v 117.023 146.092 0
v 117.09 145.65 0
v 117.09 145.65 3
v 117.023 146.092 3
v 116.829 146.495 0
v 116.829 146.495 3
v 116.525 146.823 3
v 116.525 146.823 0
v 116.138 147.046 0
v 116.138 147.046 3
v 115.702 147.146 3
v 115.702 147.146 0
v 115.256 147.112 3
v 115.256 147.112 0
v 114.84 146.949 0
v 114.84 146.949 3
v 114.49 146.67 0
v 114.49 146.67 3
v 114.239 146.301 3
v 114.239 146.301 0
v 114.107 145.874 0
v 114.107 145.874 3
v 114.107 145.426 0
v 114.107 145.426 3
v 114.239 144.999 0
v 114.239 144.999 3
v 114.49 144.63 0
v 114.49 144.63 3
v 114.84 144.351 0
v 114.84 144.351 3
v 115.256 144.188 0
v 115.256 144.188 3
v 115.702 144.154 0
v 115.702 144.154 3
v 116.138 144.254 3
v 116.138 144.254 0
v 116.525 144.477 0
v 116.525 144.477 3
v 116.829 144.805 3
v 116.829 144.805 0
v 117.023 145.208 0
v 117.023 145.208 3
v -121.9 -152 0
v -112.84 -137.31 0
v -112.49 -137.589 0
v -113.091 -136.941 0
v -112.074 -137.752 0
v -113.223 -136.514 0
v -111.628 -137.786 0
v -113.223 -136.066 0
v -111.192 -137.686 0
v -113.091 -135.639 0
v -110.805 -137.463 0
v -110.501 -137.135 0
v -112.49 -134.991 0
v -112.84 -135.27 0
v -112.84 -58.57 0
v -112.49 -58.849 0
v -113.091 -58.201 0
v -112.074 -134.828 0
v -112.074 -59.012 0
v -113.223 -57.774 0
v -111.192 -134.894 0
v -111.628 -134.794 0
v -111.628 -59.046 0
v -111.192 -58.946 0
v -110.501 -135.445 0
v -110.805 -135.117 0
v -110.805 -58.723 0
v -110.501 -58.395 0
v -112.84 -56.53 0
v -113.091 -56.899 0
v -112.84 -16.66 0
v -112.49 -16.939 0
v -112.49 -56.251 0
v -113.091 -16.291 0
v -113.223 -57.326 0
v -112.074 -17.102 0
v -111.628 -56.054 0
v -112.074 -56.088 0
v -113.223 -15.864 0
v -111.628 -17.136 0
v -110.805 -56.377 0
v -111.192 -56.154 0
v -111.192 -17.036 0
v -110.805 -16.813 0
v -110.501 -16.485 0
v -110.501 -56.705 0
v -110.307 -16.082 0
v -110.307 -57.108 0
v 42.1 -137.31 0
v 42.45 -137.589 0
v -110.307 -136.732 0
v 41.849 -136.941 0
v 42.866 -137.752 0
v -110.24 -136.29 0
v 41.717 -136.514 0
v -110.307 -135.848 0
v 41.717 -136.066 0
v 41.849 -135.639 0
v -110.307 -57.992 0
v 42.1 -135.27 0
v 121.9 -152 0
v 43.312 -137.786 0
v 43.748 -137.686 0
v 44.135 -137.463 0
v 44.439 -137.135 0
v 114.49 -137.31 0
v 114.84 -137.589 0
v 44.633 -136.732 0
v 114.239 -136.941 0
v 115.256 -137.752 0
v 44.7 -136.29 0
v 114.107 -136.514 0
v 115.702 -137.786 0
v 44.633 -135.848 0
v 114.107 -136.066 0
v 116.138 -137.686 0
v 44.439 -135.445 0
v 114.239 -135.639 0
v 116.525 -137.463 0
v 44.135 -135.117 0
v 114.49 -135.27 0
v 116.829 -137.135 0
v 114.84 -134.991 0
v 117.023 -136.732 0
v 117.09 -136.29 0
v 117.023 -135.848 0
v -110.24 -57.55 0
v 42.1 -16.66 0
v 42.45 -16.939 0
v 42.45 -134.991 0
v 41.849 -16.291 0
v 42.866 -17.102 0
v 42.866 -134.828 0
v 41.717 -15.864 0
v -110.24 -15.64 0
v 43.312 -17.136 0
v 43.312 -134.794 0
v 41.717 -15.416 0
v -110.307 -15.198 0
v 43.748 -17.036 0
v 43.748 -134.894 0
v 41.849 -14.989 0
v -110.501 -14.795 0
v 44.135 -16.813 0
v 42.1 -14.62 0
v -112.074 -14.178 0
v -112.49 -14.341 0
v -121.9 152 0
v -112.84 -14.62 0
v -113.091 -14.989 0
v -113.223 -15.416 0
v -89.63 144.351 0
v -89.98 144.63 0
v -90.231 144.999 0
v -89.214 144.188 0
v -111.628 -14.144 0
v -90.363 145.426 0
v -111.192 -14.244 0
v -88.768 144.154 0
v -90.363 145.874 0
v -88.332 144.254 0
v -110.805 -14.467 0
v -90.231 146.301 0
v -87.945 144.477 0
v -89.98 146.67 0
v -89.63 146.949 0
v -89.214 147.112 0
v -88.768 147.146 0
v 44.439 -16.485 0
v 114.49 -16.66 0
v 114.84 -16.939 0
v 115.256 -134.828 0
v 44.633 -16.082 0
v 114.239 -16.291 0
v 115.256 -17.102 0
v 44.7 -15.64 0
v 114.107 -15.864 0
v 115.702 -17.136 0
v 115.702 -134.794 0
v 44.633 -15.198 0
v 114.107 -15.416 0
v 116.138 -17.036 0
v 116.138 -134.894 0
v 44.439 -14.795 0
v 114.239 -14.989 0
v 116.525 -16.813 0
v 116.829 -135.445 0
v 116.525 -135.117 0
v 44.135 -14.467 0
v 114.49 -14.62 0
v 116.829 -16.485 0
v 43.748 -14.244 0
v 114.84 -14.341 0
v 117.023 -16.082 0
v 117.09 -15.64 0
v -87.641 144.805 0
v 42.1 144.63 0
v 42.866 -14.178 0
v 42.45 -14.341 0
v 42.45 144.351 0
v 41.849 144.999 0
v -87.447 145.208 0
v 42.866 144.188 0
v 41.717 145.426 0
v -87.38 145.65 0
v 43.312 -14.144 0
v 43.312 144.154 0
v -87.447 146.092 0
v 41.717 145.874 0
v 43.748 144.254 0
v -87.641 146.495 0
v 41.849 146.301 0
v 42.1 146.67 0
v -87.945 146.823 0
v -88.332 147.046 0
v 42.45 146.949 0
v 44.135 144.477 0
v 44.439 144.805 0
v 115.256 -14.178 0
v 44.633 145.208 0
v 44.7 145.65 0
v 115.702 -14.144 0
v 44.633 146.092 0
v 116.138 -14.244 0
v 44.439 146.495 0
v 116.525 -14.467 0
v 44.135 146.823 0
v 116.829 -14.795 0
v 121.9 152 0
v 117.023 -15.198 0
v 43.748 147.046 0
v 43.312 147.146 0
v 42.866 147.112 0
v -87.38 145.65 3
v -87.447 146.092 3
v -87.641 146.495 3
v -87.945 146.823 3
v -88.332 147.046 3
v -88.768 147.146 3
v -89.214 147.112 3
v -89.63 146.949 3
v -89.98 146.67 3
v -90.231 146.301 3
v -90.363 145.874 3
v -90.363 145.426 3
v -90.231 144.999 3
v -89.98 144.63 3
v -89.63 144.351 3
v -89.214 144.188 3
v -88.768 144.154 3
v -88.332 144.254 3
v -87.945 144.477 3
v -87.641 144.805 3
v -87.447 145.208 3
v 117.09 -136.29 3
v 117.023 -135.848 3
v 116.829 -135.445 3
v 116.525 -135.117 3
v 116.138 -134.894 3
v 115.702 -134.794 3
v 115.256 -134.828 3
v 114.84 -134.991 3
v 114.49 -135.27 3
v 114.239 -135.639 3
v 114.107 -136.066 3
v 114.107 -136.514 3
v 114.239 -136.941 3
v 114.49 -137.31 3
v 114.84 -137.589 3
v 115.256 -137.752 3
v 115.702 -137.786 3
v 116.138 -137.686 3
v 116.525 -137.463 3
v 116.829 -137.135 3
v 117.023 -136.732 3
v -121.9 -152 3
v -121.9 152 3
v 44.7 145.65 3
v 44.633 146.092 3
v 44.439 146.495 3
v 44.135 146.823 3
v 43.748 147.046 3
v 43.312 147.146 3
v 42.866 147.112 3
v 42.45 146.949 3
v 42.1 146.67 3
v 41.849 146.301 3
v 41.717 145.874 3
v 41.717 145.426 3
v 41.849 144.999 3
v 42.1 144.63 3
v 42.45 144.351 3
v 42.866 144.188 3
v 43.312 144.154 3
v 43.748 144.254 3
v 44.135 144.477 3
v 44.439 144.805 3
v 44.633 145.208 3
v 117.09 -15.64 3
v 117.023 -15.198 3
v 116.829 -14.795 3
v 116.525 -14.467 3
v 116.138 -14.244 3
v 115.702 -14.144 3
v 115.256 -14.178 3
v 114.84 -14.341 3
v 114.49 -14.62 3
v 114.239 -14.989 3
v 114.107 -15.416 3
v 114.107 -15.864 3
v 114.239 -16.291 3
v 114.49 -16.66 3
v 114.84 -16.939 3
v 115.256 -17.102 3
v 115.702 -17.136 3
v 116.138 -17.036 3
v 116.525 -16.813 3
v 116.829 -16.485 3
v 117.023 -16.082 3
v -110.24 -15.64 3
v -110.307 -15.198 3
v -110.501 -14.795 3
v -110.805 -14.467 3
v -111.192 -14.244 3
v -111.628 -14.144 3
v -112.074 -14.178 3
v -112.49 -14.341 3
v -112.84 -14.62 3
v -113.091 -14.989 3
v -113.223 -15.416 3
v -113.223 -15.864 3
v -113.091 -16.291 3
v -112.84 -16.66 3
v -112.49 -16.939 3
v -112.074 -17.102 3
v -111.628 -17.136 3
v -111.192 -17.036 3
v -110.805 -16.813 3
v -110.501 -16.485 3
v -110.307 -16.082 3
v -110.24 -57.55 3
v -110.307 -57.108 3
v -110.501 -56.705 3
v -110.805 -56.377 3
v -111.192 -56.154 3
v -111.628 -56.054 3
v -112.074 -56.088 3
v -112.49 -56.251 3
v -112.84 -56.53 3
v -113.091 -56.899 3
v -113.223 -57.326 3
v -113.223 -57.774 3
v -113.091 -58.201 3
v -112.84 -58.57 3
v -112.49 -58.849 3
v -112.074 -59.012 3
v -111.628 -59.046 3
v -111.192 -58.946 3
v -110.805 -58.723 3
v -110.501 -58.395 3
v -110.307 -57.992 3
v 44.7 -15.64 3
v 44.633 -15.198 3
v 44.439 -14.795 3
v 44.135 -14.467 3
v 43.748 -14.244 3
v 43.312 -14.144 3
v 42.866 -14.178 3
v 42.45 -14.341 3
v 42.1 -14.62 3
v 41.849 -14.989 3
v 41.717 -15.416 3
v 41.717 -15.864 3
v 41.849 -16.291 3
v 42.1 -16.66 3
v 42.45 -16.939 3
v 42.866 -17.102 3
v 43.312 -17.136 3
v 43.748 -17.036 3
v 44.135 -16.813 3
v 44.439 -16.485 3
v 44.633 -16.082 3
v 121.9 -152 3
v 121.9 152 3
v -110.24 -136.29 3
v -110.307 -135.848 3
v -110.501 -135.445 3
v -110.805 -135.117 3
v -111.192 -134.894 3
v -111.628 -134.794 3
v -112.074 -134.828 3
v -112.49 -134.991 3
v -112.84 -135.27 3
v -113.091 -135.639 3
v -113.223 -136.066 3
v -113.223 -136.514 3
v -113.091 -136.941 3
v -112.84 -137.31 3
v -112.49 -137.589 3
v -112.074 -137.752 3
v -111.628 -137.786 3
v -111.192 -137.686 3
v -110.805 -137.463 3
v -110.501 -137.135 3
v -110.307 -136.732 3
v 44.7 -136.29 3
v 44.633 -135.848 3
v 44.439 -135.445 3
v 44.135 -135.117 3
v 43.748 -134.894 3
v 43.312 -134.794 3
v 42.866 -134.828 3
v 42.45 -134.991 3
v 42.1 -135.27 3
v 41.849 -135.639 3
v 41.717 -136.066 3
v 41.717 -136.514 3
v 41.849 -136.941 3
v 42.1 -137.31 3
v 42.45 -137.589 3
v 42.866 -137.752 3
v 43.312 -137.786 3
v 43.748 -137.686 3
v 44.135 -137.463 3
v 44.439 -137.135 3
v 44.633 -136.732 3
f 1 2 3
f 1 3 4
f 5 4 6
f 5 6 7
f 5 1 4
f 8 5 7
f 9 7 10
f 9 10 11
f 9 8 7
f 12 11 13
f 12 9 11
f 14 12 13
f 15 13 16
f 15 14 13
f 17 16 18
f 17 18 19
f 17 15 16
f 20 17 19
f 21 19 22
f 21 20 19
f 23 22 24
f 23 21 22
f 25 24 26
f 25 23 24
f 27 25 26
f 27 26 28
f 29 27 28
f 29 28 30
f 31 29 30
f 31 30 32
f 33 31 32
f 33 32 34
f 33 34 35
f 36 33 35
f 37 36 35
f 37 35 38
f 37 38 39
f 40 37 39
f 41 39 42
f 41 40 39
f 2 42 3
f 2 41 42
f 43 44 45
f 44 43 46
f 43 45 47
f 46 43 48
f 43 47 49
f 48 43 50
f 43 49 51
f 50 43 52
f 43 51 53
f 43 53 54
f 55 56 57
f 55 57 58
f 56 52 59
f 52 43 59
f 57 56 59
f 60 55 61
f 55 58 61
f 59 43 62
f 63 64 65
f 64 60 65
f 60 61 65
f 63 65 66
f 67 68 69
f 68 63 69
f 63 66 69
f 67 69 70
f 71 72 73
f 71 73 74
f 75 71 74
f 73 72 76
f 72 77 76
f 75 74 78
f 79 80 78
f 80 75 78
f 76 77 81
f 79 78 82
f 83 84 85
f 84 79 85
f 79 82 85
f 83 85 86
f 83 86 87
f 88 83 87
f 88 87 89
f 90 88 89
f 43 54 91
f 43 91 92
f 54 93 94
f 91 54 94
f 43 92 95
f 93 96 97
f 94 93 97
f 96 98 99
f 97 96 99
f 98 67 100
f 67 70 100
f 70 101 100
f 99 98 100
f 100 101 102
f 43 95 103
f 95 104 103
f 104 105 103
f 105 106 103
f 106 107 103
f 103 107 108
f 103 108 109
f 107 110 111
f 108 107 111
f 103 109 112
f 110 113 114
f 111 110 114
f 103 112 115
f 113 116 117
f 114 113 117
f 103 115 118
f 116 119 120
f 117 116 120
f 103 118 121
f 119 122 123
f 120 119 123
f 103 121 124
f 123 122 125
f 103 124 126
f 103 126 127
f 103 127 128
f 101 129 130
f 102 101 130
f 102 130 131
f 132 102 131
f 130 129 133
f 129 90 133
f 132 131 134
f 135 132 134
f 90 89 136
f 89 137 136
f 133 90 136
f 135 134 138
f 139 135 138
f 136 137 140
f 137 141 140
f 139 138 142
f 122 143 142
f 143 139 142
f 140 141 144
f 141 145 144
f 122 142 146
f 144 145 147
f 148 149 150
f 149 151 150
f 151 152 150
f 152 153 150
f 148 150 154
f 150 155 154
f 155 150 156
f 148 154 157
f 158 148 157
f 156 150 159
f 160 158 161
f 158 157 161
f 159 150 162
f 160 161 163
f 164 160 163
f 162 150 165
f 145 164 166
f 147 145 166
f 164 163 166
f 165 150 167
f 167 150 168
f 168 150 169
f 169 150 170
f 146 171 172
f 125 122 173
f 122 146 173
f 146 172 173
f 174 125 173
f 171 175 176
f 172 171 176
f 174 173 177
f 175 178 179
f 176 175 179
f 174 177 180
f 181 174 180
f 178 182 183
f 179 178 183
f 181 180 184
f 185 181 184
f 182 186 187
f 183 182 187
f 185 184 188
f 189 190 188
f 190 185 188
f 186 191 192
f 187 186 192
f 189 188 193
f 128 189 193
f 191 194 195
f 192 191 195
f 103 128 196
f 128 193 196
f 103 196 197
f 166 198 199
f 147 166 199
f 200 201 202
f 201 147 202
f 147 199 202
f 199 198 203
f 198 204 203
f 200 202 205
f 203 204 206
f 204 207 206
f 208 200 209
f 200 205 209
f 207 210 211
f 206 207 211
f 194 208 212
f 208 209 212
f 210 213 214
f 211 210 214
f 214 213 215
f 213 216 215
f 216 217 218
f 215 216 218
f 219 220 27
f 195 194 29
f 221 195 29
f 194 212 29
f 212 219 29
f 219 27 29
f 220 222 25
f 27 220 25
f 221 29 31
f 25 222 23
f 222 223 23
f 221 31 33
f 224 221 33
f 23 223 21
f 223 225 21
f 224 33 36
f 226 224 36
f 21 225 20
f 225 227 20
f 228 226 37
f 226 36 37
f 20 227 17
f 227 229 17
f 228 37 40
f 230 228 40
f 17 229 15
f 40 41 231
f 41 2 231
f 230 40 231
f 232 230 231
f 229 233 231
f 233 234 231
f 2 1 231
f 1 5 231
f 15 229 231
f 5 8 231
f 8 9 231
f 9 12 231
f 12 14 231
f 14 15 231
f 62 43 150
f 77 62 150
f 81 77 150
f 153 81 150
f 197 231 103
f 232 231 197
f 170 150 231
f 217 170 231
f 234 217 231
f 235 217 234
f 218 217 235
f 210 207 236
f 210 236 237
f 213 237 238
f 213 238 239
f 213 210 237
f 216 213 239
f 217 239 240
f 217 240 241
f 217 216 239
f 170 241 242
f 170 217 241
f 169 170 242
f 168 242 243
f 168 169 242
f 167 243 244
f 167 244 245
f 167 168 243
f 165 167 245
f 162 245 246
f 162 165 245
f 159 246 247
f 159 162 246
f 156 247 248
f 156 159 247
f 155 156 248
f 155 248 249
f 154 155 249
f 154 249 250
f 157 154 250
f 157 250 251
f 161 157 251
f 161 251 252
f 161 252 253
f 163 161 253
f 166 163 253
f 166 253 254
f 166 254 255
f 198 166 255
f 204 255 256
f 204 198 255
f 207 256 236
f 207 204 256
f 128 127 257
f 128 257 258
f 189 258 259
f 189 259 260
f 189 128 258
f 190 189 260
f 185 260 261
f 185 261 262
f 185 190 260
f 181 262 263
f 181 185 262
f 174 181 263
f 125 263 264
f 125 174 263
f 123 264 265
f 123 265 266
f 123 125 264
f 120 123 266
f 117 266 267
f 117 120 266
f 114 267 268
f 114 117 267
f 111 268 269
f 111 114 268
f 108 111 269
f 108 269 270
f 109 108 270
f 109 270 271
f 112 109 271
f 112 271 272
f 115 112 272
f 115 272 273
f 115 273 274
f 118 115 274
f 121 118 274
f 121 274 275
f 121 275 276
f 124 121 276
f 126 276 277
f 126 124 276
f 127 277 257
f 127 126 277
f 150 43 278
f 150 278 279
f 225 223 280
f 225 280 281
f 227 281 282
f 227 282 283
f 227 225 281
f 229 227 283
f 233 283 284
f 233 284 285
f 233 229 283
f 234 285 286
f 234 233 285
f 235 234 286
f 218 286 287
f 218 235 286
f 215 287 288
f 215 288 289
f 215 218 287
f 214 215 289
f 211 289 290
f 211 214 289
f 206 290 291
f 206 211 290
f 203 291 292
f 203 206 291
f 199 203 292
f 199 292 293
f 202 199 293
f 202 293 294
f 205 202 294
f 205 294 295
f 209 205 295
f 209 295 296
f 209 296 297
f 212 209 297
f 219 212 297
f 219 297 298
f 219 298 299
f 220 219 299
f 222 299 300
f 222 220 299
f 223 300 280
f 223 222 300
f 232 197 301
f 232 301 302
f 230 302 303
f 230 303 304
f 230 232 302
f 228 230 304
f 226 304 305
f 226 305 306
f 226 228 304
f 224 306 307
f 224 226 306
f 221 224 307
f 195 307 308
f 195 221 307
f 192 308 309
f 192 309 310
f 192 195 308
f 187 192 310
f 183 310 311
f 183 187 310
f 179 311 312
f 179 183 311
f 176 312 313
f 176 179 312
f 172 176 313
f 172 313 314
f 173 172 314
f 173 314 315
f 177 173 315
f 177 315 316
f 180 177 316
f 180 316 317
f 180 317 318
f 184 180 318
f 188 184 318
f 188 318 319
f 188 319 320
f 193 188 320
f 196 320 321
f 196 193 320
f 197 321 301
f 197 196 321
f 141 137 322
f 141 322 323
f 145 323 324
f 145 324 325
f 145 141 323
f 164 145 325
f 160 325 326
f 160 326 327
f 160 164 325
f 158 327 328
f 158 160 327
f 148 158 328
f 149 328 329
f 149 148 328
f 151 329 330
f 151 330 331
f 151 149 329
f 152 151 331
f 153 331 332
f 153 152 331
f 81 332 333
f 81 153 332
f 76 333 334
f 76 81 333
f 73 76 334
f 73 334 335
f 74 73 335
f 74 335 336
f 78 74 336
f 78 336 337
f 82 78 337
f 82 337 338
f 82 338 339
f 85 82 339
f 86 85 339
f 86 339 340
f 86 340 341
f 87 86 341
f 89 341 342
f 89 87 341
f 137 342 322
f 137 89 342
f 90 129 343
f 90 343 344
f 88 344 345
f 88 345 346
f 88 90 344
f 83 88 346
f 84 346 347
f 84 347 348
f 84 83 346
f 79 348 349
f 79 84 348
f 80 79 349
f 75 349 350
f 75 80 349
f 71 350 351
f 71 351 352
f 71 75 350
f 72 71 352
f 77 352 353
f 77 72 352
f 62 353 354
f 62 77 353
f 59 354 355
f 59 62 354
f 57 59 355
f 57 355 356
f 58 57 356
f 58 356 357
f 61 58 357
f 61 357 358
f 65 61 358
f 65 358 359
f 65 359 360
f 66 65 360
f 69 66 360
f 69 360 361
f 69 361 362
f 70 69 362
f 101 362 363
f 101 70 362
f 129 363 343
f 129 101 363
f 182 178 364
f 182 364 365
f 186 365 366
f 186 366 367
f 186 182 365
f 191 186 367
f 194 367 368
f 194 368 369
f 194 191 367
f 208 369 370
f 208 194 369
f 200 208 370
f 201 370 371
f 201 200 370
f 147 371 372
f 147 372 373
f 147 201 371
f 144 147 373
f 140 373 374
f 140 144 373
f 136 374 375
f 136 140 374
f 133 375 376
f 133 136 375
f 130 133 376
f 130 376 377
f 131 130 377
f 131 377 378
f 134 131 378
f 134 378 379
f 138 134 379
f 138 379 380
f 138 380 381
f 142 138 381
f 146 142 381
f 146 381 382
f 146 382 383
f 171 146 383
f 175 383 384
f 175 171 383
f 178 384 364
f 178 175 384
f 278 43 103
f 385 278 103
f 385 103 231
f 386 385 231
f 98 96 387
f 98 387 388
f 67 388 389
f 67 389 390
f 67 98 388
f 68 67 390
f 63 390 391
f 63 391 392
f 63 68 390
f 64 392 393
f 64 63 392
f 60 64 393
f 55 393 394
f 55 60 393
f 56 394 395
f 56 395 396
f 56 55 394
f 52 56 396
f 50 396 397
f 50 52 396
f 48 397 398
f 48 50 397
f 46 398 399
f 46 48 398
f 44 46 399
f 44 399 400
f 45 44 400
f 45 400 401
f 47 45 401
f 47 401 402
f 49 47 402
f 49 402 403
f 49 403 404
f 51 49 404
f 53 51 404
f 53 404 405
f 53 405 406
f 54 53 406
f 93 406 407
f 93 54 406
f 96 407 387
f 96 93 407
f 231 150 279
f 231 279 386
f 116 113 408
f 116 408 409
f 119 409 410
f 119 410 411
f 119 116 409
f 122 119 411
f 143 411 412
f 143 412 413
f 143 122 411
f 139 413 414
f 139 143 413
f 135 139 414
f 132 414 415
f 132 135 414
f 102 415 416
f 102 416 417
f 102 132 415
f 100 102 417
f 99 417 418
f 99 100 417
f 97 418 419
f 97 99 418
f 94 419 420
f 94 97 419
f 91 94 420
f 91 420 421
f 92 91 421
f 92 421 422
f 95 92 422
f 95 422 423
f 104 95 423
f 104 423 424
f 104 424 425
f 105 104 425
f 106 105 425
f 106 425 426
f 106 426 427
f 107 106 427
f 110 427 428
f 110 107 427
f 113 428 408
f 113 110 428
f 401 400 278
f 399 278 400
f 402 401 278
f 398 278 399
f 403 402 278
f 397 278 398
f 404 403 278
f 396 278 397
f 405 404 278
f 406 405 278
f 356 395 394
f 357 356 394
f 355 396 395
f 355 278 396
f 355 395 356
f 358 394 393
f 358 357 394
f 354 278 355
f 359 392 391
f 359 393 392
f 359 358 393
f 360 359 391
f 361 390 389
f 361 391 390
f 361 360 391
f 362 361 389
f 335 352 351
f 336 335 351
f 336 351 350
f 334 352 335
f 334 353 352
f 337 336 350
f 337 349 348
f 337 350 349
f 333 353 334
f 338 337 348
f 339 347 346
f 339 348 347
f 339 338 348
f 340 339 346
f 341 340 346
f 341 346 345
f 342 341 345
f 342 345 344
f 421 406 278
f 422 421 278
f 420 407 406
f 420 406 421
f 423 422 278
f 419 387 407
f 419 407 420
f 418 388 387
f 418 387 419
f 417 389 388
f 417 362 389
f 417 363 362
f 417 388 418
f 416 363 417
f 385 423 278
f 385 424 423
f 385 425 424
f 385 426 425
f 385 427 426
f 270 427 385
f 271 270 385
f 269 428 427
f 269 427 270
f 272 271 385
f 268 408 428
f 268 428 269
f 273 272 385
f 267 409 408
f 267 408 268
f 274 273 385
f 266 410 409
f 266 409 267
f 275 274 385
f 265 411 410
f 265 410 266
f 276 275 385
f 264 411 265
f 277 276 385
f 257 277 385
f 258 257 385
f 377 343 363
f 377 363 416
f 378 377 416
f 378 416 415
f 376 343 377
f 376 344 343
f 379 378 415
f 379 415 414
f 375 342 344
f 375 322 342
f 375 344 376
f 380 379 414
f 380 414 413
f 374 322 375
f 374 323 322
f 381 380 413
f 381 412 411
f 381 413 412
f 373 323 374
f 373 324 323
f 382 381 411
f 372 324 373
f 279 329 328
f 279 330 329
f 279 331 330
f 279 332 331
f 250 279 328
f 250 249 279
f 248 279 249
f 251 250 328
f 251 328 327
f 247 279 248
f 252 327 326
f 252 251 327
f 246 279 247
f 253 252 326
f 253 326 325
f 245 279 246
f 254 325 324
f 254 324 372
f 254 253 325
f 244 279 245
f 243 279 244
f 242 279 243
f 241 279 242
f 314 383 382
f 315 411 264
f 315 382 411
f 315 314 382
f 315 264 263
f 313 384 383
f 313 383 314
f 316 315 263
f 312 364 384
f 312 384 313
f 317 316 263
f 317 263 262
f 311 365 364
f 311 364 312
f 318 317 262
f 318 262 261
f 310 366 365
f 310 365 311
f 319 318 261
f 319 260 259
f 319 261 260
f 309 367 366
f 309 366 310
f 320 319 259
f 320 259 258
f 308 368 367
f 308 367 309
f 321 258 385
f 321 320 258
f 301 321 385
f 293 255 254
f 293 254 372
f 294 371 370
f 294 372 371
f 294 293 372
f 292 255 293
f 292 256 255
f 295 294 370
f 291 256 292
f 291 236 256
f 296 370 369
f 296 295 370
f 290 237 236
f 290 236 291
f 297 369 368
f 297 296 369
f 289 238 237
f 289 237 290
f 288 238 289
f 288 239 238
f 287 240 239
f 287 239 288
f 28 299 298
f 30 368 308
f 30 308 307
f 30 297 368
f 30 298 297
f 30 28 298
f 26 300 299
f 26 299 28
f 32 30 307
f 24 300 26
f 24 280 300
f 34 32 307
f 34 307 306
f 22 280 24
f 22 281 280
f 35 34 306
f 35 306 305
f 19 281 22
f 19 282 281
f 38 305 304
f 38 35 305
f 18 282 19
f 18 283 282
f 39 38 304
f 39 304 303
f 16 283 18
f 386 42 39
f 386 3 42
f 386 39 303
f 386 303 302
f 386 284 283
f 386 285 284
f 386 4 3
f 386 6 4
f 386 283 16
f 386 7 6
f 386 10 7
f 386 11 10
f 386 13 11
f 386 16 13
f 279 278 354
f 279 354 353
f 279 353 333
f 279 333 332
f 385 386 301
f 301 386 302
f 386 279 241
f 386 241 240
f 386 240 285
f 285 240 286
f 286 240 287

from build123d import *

# Parameters (mm, degrees)
F0_W     = 243.8
F0_H     = 304
F0_R     = 1.5
F1_DEPTH = 3


with BuildPart() as f1:
    # F0 (on Top) → F1 (new body)
    with BuildSketch(Plane.XY):
        Rectangle(F0_W, F0_H)
        with Locations((-111.74, -136.29)):
            Circle(F0_R, mode=Mode.SUBTRACT)
        with Locations((-111.74, -57.55)):
            Circle(F0_R, mode=Mode.SUBTRACT)
        with Locations((-111.74, -15.64)):
            Circle(F0_R, mode=Mode.SUBTRACT)
        with Locations((43.2, -136.29)):
            Circle(F0_R, mode=Mode.SUBTRACT)
        with Locations((115.59, -136.29)):
            Circle(F0_R, mode=Mode.SUBTRACT)
        with Locations((43.2, -15.64)):
            Circle(F0_R, mode=Mode.SUBTRACT)
        with Locations((115.59, -15.64)):
            Circle(F0_R, mode=Mode.SUBTRACT)
        with Locations((-88.88, 145.65)):
            Circle(F0_R, mode=Mode.SUBTRACT)
        with Locations((43.2, 145.65)):
            Circle(F0_R, mode=Mode.SUBTRACT)
        with Locations((115.59, 145.65)):
            Circle(F0_R, mode=Mode.SUBTRACT)
    extrude(amount=F1_DEPTH)


solid = f1.part
